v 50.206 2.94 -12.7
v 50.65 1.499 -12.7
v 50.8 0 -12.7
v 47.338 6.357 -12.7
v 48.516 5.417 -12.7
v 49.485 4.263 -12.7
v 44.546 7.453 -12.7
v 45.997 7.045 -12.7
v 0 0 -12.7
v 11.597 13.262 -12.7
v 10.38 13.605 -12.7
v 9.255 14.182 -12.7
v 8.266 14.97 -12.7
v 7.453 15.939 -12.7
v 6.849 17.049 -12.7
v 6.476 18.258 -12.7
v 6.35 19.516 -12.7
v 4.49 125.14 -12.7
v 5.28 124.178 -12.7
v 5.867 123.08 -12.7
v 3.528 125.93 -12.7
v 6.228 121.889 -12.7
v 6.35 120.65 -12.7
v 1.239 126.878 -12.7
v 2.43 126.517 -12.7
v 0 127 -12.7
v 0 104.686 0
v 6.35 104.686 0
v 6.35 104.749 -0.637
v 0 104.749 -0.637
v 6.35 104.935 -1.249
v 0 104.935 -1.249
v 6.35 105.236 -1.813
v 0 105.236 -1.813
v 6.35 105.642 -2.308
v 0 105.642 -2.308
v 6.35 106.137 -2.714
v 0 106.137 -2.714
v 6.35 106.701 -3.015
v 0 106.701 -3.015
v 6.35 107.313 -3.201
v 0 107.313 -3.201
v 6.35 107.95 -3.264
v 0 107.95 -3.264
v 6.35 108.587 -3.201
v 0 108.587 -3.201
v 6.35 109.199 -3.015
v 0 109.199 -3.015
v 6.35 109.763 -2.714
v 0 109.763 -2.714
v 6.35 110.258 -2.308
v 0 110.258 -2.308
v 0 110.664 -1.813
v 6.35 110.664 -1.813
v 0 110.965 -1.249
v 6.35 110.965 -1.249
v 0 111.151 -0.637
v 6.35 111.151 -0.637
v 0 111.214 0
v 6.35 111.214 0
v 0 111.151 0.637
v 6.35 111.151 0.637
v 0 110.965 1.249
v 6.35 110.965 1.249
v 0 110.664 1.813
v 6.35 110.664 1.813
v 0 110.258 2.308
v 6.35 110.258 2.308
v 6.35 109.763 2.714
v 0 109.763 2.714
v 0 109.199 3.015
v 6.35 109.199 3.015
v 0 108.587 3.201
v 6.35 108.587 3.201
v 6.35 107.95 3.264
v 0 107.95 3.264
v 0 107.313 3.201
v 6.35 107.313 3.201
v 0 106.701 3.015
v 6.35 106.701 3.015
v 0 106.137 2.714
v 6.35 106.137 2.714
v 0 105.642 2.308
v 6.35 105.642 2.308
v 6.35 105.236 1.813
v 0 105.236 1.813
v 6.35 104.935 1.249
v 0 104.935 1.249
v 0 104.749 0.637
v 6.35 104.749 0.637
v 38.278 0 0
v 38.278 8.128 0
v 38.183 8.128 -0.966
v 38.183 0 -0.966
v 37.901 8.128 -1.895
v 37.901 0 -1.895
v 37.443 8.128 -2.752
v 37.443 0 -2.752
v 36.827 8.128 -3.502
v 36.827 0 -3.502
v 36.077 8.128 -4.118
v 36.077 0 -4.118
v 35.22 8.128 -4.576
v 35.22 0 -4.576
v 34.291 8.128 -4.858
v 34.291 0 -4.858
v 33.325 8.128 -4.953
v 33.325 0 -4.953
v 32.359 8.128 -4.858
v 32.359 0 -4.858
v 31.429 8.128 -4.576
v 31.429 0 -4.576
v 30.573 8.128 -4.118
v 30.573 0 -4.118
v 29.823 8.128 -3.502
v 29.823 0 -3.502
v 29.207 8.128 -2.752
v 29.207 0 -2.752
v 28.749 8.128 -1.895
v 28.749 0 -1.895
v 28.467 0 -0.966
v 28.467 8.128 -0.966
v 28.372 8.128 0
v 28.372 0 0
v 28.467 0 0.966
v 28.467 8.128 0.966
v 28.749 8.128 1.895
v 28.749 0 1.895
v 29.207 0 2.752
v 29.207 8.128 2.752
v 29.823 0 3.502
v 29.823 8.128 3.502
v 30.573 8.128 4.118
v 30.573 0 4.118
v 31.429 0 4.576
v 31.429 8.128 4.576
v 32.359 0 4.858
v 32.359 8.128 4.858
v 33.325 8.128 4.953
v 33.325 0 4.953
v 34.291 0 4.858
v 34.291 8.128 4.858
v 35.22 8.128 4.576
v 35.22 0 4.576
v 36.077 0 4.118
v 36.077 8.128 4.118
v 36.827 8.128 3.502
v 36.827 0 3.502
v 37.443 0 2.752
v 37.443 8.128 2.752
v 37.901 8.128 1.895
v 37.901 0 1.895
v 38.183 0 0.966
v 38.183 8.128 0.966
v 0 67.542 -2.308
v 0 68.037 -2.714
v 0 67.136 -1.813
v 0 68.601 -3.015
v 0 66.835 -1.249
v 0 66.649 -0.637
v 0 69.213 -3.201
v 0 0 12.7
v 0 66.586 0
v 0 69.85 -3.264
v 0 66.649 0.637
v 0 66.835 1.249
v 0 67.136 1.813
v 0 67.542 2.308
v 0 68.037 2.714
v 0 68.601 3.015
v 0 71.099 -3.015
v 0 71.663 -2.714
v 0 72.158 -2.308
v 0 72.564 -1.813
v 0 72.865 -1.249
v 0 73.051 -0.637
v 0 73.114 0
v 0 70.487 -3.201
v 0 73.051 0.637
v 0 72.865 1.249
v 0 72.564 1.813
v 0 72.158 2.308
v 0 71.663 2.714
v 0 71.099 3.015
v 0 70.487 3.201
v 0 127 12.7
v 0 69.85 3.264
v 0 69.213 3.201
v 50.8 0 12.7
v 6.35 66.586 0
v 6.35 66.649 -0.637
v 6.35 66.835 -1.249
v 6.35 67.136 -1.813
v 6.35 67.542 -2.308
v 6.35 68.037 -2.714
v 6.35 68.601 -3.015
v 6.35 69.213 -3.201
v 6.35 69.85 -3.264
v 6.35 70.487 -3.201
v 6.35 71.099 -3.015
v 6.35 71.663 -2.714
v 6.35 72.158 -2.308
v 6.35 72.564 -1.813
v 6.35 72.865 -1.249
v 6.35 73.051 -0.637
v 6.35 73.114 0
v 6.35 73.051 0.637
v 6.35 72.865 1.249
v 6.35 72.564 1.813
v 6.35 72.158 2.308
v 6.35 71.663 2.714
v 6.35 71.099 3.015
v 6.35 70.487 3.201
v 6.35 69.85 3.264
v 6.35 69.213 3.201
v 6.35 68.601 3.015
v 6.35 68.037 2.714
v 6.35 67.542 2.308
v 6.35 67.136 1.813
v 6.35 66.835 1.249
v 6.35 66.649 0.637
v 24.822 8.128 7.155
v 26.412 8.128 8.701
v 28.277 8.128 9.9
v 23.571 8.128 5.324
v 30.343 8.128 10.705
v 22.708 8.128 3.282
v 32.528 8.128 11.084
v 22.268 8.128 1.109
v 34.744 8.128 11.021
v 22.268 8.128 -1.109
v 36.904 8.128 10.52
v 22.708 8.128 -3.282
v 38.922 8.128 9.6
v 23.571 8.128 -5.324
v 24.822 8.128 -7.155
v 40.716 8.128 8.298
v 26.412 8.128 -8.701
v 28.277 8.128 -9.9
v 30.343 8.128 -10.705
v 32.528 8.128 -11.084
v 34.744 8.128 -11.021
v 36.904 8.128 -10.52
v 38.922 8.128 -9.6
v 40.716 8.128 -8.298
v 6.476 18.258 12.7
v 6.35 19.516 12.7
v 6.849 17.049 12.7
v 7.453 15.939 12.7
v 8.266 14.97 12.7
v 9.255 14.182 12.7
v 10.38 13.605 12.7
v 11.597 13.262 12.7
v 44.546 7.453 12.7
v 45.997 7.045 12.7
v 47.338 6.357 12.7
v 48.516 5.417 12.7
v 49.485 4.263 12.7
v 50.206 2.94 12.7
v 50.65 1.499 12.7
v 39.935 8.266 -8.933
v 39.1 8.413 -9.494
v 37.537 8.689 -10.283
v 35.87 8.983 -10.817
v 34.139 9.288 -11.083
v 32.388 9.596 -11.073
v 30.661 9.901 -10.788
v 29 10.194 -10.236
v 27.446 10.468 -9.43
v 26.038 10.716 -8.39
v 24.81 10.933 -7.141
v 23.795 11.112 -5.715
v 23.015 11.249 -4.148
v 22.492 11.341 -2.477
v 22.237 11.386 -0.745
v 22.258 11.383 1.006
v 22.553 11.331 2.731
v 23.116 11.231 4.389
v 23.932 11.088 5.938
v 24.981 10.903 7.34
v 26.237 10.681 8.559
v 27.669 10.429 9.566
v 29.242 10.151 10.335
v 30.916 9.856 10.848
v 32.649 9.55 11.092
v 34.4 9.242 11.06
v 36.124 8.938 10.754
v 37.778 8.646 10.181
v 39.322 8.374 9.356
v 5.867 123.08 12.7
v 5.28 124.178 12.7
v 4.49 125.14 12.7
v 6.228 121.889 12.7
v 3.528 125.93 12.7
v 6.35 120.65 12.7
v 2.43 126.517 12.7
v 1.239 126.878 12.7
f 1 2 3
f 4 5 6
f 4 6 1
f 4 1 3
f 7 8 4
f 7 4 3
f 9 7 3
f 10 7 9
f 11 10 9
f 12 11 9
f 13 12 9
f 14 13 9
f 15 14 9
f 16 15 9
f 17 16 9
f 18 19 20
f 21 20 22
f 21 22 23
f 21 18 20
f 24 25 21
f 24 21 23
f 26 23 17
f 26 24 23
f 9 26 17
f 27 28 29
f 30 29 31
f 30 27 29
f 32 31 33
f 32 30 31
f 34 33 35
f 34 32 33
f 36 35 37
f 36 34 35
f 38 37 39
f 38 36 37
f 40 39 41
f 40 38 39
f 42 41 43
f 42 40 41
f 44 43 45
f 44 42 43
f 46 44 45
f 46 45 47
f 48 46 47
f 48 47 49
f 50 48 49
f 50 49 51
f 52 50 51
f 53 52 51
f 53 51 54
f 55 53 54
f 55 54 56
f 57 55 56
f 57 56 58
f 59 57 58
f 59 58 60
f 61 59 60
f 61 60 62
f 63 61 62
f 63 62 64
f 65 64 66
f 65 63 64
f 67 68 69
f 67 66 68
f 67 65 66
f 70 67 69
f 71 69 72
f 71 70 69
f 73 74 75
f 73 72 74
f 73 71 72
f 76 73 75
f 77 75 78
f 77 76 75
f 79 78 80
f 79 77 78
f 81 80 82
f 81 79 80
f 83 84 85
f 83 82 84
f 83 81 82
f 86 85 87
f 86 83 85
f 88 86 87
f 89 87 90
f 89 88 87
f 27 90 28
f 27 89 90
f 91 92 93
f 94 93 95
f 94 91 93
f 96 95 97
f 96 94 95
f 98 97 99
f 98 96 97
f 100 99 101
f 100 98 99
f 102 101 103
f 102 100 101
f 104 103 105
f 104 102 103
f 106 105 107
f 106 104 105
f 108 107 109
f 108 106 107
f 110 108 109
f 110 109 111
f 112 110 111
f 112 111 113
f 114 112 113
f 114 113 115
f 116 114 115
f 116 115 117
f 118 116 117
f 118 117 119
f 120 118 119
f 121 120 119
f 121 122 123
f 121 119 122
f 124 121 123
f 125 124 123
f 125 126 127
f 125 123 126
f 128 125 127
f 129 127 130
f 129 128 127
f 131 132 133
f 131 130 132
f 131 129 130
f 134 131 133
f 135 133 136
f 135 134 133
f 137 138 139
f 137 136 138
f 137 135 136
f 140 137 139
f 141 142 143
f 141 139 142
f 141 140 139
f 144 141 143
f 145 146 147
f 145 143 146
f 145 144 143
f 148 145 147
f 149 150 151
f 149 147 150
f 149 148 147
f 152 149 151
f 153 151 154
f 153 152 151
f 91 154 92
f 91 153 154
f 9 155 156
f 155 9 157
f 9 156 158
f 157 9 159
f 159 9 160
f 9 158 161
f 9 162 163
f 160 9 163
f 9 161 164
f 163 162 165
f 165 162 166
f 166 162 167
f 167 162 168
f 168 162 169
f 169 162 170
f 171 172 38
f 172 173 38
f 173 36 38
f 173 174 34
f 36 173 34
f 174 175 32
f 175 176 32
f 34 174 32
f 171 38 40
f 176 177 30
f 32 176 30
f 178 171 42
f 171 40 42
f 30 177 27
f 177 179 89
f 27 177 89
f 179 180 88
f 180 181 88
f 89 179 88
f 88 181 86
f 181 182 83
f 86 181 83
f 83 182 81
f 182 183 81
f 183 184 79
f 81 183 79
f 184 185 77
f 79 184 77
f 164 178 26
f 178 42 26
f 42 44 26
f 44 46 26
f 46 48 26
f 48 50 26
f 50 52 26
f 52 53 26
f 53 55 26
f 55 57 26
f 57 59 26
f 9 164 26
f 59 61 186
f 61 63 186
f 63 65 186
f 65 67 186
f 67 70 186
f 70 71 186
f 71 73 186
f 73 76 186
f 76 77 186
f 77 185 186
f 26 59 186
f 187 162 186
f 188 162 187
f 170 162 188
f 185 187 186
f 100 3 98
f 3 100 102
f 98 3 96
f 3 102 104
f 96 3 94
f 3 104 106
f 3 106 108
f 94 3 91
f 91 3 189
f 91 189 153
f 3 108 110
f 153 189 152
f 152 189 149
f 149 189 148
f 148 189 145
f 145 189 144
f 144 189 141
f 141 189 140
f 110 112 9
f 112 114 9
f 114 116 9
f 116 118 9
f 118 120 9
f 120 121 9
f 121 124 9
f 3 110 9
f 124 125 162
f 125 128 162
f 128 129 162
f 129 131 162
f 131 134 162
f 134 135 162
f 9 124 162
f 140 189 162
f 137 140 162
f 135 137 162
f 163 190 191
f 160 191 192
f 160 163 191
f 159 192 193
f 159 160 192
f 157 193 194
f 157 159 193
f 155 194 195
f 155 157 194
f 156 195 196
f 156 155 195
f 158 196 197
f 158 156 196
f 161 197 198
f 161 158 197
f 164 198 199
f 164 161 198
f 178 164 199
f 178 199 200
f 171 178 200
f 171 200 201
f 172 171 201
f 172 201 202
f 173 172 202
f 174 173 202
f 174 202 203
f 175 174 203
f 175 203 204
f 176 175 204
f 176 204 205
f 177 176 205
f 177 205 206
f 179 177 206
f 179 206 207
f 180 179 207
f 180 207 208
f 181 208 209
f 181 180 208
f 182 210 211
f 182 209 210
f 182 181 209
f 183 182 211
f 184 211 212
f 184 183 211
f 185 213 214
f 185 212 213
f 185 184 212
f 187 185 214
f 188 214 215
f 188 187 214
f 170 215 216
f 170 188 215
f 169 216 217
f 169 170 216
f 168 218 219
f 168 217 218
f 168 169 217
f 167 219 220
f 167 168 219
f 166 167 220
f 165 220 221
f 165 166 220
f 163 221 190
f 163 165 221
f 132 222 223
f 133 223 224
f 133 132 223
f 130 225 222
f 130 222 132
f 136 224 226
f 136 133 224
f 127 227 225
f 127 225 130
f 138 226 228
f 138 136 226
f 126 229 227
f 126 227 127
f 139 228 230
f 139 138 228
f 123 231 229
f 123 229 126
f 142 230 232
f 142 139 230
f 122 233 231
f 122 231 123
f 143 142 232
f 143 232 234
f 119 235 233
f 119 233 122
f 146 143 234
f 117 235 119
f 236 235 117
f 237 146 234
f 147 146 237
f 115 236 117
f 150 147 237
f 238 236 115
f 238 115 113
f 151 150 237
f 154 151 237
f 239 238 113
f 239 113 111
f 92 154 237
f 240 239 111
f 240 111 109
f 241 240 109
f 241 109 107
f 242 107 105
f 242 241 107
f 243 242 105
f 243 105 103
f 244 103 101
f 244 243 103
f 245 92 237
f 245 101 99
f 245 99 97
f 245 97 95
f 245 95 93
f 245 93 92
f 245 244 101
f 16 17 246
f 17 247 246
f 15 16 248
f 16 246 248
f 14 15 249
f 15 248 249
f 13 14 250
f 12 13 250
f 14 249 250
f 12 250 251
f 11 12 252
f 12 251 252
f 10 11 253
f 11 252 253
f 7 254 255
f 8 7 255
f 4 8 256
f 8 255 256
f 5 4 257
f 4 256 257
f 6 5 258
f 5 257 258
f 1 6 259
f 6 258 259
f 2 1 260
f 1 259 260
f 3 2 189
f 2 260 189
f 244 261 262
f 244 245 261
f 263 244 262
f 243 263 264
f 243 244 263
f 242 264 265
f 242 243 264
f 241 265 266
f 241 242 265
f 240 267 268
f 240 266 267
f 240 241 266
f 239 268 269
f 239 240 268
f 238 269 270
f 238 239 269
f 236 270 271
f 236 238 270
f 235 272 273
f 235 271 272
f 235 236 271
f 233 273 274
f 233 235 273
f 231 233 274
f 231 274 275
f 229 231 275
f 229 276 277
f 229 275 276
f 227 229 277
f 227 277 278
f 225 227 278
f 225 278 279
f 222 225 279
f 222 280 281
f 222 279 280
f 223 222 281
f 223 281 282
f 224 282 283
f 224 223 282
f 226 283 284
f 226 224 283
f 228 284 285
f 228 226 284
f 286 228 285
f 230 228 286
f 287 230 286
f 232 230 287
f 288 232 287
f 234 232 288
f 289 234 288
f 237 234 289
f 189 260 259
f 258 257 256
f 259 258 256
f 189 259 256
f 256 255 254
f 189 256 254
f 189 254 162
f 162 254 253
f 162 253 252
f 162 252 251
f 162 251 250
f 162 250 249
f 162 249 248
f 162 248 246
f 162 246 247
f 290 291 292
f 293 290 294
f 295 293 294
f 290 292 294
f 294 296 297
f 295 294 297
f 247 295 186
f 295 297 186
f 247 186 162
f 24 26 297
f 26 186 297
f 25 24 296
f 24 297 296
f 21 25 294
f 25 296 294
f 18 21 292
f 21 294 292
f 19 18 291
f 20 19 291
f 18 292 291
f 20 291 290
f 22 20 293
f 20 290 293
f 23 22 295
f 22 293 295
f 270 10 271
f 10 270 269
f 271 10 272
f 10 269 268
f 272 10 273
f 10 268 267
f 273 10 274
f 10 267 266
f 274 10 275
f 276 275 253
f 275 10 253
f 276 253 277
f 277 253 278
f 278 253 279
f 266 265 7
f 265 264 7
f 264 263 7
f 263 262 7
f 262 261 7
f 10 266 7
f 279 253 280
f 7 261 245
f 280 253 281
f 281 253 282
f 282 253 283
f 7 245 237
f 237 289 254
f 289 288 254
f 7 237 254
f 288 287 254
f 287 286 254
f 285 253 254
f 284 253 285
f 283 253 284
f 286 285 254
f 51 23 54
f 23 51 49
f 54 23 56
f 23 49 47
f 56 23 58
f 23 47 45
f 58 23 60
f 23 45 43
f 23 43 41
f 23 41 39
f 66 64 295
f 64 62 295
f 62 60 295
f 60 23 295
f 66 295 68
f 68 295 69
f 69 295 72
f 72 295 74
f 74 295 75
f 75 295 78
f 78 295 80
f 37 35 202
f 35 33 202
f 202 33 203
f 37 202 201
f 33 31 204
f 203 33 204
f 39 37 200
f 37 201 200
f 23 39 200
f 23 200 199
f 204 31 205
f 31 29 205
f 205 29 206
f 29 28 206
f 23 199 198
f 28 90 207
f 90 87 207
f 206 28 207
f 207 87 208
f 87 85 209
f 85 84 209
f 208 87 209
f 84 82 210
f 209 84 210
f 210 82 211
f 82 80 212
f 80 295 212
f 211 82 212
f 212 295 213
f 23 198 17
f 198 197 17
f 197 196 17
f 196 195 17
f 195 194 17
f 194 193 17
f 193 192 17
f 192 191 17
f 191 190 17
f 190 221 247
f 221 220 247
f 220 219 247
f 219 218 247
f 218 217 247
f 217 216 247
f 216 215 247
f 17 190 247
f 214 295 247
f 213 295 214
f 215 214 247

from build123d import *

# Parameters (mm, degrees)
BOSS_EXTRUDE1_DEPTH = 12.7
SKETCH2_R           = 4.953
CUT_EXTRUDE1_DEPTH  = 138.371503595
CUT_EXTRUDE2_START  = 8.128
SKETCH3_R           = 11.1125
CUT_EXTRUDE2_DEPTH  = 130.243503595
SKETCH4_R           = 3.2639
CUT_EXTRUDE3_DEPTH  = 138.371503595


with BuildPart() as part:
    # Sketch1 → Boss-Extrude1 (new, symmetric)
    with BuildSketch(Plane.XY):
        with BuildLine():
            Line((0, 0), (0, 127))
            ThreePointArc((0, 127), (4.490128061, 125.140128061), (6.35, 120.65))
            Line((6.35, 120.65), (6.35, 19.51601695))
            ThreePointArc((6.35, 19.51601695), (7.835617786, 15.434315629), (11.597334072, 13.262487719))
            Line((11.597334072, 13.262487719), (44.546470768, 7.452665928))
            ThreePointArc((44.546470768, 7.452665928), (49.029509666, 4.864382214), (50.8, 0))
            Line((50.8, 0), (0, 0))
        make_face()
    extrude(amount=BOSS_EXTRUDE1_DEPTH, both=True)

    # Sketch2 → Cut-Extrude1 (cut, through all)
    with BuildSketch(Plane(origin=(0, 0, 0), x_dir=(1, 0, 0), z_dir=(0, 1, 0))):
        with Locations((33.3248, 0)):
            Circle(SKETCH2_R)
    extrude(amount=CUT_EXTRUDE1_DEPTH, mode=Mode.SUBTRACT)

    # Sketch3 → Cut-Extrude2 (cut, through all)
    with BuildSketch(Plane(origin=(0, 0, 0), x_dir=(1, 0, 0), z_dir=(0, 1, 0)).offset(CUT_EXTRUDE2_START)):
        with Locations((33.3248, 0)):
            Circle(SKETCH3_R)
    extrude(amount=CUT_EXTRUDE2_DEPTH, mode=Mode.SUBTRACT)

    # Sketch4 → Cut-Extrude3 (cut, through all)
    with BuildSketch(Plane(origin=(0, 0, 0), x_dir=(0, 0, -1), z_dir=(1, 0, 0))):
        with Locations(Location((0, 69.85, 0), (0, 0, 270))):
            Circle(SKETCH4_R)
        with Locations(Location((0, 107.95, 0), (0, 0, 270))):
            Circle(SKETCH4_R)
    extrude(amount=CUT_EXTRUDE3_DEPTH, mode=Mode.SUBTRACT)


solid = part.part
